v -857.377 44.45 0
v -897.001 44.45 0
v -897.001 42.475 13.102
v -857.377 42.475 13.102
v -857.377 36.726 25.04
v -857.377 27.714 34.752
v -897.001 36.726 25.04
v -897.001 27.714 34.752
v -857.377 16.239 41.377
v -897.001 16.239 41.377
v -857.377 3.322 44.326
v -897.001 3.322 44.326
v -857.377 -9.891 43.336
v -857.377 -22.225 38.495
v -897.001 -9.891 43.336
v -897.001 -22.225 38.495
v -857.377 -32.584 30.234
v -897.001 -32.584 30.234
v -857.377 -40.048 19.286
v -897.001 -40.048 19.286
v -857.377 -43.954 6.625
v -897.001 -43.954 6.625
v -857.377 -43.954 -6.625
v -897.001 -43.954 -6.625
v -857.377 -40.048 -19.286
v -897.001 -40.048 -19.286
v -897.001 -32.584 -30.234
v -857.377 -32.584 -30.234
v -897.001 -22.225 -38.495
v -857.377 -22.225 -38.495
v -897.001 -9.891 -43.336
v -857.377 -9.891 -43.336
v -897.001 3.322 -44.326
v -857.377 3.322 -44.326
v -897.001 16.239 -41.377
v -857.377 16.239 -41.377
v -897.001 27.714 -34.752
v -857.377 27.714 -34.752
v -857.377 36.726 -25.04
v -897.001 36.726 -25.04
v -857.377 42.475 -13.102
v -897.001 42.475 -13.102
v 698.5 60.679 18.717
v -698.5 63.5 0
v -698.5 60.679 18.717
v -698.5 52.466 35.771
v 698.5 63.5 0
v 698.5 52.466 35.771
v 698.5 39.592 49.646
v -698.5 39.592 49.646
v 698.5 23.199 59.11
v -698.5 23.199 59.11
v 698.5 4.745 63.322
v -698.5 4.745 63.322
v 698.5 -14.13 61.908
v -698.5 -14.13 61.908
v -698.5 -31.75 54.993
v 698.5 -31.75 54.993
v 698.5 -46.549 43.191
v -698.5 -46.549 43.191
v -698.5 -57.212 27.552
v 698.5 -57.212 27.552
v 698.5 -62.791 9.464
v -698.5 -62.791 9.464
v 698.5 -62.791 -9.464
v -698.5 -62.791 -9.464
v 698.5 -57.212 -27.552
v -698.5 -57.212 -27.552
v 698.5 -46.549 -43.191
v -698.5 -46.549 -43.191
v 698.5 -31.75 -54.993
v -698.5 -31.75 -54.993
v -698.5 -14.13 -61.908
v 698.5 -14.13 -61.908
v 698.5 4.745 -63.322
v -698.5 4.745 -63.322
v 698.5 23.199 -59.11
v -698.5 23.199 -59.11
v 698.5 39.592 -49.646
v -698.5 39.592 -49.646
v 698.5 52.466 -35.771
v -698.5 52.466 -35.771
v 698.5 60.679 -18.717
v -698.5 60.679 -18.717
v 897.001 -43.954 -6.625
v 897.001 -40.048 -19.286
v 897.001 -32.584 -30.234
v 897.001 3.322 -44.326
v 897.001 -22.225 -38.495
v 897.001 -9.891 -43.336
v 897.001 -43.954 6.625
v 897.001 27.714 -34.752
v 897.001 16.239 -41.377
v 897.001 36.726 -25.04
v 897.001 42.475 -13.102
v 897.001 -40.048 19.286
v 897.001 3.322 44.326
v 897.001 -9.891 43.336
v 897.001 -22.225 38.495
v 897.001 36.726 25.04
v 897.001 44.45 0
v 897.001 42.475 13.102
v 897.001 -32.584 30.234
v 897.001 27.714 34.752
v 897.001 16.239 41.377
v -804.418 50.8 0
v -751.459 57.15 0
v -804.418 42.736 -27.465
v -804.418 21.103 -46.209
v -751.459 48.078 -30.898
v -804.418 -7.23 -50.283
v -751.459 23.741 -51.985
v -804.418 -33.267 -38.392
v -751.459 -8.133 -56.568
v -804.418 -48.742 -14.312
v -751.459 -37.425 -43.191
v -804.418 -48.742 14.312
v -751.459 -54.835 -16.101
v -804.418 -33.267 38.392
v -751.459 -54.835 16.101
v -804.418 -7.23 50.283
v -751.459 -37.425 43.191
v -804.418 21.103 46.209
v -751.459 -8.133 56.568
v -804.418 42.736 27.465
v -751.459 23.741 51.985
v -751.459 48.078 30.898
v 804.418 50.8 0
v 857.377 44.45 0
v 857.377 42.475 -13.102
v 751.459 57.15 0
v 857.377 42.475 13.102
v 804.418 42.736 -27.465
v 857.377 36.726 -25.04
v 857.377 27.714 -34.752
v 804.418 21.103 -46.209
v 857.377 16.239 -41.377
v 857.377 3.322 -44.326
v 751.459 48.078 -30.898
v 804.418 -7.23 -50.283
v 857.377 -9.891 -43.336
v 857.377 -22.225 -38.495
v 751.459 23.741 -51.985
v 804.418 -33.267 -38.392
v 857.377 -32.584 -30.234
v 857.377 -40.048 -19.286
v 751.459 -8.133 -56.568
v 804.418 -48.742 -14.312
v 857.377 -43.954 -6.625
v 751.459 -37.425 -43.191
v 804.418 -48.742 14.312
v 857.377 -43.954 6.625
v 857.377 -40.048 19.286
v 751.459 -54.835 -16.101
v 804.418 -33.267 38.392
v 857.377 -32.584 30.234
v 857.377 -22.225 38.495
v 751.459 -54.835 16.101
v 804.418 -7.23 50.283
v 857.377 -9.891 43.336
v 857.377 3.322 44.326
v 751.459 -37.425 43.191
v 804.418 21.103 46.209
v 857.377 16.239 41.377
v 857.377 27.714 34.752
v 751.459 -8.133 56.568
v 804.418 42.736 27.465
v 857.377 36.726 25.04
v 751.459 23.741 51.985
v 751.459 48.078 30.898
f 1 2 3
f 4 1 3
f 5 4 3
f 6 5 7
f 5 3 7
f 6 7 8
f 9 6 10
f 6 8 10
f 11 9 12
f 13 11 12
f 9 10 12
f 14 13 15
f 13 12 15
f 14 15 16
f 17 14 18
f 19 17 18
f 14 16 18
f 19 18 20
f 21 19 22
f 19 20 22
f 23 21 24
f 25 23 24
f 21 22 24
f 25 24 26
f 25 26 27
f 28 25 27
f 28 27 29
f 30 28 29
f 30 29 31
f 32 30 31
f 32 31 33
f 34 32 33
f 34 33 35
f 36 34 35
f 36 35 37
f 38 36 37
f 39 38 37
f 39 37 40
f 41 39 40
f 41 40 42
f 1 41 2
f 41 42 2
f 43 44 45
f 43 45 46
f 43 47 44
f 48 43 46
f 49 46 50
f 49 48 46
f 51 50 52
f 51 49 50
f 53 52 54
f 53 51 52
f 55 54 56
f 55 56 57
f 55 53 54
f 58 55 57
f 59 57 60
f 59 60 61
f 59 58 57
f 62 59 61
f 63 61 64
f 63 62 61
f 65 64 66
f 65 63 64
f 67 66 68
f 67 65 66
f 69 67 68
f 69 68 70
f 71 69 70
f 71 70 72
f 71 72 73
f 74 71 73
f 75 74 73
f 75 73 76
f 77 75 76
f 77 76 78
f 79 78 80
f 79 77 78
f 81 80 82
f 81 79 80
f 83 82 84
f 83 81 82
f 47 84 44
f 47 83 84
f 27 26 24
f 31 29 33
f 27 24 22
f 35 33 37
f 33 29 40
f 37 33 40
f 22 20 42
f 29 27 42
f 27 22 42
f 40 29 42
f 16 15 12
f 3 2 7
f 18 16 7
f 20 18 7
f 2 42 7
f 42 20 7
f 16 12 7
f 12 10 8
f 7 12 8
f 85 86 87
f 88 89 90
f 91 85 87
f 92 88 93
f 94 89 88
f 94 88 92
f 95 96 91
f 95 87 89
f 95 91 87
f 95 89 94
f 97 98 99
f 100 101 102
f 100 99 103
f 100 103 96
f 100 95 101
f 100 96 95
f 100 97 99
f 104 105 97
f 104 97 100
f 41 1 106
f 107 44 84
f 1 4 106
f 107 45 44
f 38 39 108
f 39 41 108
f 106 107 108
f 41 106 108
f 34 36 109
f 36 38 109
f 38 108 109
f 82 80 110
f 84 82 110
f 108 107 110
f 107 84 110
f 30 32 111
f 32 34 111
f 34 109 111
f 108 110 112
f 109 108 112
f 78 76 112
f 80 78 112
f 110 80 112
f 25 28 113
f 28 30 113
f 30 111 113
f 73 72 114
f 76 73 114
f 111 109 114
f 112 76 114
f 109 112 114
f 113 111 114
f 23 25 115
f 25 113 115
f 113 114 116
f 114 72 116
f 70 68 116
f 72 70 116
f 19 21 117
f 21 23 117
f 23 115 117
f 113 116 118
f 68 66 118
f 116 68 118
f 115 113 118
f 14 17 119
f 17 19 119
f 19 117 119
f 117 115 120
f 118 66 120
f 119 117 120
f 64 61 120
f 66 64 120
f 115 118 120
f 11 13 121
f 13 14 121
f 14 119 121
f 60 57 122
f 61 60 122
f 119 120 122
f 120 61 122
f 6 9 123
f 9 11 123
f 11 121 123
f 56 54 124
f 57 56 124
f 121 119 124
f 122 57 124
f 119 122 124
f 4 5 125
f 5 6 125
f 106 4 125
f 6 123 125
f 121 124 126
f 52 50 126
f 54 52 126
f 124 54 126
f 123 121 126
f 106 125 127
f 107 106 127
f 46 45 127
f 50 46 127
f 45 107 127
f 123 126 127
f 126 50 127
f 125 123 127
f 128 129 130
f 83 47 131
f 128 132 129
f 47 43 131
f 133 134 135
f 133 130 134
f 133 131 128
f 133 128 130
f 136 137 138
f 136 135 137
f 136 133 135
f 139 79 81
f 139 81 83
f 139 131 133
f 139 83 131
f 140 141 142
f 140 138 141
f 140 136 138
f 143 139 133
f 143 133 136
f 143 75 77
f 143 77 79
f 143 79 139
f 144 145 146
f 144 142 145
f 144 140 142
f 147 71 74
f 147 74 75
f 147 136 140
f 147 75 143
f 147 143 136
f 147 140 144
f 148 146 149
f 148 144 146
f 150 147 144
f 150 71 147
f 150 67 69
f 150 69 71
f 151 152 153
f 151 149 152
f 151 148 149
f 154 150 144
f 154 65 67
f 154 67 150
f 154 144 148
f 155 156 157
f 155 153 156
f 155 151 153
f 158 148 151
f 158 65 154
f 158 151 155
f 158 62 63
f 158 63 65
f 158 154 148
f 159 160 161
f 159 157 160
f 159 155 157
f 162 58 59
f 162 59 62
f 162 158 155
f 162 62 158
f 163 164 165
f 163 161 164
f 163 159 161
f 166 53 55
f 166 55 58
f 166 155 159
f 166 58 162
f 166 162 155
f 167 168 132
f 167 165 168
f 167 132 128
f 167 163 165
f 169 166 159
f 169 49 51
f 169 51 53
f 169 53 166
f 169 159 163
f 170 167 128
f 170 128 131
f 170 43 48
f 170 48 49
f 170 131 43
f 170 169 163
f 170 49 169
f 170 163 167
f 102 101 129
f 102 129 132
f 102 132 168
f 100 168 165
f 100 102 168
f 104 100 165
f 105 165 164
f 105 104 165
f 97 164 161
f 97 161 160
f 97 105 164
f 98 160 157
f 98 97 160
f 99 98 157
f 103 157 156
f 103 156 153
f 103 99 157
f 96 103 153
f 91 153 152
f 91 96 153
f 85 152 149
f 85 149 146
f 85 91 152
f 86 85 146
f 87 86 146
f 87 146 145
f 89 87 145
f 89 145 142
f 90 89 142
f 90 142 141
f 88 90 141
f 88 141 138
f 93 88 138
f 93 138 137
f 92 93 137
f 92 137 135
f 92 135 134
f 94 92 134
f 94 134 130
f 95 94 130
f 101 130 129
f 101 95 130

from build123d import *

# Parameters (mm, degrees)
F0_R      = 63.5
F1_DEPTH  = 698.5
F3_R      = 44.45
F4_DEPTH  = 39.624
F4_FACE_R = 44.45
F1_FACE_R = 63.5


with BuildPart() as f1:
    # F0 (on Right) → F1 (new body, symmetric)
    with BuildSketch(Plane.YZ):
        Circle(F0_R)
    extrude(amount=F1_DEPTH, both=True)



with BuildPart() as f4:
    # F3 (on offset) → F4 (new body)
    with BuildSketch(Plane.YZ.offset(897.001)):
        Circle(F3_R)
    extrude(amount=-F4_DEPTH)


with BuildPart() as f1_1:
    add(f1.part)

    add(f4.part)  # F5 merges F4
    # F4_face (on face) → F5 section 0
    with BuildSketch(Plane(origin=(857.377, 0, 0), x_dir=(0, 1, 0), z_dir=(-1, 0, 0))):
        Circle(F4_FACE_R)
    # F1_face (on face) → F5 section 1
    with BuildSketch(Plane.YZ.offset(698.5)):
        Circle(F1_FACE_R)
    loft()

    # F6: F1 across plane


with BuildPart() as f1_2:
    add(f1_1.part)
    add(f1_1.part.mirror(Plane.YZ))


solid = f1_2.part
